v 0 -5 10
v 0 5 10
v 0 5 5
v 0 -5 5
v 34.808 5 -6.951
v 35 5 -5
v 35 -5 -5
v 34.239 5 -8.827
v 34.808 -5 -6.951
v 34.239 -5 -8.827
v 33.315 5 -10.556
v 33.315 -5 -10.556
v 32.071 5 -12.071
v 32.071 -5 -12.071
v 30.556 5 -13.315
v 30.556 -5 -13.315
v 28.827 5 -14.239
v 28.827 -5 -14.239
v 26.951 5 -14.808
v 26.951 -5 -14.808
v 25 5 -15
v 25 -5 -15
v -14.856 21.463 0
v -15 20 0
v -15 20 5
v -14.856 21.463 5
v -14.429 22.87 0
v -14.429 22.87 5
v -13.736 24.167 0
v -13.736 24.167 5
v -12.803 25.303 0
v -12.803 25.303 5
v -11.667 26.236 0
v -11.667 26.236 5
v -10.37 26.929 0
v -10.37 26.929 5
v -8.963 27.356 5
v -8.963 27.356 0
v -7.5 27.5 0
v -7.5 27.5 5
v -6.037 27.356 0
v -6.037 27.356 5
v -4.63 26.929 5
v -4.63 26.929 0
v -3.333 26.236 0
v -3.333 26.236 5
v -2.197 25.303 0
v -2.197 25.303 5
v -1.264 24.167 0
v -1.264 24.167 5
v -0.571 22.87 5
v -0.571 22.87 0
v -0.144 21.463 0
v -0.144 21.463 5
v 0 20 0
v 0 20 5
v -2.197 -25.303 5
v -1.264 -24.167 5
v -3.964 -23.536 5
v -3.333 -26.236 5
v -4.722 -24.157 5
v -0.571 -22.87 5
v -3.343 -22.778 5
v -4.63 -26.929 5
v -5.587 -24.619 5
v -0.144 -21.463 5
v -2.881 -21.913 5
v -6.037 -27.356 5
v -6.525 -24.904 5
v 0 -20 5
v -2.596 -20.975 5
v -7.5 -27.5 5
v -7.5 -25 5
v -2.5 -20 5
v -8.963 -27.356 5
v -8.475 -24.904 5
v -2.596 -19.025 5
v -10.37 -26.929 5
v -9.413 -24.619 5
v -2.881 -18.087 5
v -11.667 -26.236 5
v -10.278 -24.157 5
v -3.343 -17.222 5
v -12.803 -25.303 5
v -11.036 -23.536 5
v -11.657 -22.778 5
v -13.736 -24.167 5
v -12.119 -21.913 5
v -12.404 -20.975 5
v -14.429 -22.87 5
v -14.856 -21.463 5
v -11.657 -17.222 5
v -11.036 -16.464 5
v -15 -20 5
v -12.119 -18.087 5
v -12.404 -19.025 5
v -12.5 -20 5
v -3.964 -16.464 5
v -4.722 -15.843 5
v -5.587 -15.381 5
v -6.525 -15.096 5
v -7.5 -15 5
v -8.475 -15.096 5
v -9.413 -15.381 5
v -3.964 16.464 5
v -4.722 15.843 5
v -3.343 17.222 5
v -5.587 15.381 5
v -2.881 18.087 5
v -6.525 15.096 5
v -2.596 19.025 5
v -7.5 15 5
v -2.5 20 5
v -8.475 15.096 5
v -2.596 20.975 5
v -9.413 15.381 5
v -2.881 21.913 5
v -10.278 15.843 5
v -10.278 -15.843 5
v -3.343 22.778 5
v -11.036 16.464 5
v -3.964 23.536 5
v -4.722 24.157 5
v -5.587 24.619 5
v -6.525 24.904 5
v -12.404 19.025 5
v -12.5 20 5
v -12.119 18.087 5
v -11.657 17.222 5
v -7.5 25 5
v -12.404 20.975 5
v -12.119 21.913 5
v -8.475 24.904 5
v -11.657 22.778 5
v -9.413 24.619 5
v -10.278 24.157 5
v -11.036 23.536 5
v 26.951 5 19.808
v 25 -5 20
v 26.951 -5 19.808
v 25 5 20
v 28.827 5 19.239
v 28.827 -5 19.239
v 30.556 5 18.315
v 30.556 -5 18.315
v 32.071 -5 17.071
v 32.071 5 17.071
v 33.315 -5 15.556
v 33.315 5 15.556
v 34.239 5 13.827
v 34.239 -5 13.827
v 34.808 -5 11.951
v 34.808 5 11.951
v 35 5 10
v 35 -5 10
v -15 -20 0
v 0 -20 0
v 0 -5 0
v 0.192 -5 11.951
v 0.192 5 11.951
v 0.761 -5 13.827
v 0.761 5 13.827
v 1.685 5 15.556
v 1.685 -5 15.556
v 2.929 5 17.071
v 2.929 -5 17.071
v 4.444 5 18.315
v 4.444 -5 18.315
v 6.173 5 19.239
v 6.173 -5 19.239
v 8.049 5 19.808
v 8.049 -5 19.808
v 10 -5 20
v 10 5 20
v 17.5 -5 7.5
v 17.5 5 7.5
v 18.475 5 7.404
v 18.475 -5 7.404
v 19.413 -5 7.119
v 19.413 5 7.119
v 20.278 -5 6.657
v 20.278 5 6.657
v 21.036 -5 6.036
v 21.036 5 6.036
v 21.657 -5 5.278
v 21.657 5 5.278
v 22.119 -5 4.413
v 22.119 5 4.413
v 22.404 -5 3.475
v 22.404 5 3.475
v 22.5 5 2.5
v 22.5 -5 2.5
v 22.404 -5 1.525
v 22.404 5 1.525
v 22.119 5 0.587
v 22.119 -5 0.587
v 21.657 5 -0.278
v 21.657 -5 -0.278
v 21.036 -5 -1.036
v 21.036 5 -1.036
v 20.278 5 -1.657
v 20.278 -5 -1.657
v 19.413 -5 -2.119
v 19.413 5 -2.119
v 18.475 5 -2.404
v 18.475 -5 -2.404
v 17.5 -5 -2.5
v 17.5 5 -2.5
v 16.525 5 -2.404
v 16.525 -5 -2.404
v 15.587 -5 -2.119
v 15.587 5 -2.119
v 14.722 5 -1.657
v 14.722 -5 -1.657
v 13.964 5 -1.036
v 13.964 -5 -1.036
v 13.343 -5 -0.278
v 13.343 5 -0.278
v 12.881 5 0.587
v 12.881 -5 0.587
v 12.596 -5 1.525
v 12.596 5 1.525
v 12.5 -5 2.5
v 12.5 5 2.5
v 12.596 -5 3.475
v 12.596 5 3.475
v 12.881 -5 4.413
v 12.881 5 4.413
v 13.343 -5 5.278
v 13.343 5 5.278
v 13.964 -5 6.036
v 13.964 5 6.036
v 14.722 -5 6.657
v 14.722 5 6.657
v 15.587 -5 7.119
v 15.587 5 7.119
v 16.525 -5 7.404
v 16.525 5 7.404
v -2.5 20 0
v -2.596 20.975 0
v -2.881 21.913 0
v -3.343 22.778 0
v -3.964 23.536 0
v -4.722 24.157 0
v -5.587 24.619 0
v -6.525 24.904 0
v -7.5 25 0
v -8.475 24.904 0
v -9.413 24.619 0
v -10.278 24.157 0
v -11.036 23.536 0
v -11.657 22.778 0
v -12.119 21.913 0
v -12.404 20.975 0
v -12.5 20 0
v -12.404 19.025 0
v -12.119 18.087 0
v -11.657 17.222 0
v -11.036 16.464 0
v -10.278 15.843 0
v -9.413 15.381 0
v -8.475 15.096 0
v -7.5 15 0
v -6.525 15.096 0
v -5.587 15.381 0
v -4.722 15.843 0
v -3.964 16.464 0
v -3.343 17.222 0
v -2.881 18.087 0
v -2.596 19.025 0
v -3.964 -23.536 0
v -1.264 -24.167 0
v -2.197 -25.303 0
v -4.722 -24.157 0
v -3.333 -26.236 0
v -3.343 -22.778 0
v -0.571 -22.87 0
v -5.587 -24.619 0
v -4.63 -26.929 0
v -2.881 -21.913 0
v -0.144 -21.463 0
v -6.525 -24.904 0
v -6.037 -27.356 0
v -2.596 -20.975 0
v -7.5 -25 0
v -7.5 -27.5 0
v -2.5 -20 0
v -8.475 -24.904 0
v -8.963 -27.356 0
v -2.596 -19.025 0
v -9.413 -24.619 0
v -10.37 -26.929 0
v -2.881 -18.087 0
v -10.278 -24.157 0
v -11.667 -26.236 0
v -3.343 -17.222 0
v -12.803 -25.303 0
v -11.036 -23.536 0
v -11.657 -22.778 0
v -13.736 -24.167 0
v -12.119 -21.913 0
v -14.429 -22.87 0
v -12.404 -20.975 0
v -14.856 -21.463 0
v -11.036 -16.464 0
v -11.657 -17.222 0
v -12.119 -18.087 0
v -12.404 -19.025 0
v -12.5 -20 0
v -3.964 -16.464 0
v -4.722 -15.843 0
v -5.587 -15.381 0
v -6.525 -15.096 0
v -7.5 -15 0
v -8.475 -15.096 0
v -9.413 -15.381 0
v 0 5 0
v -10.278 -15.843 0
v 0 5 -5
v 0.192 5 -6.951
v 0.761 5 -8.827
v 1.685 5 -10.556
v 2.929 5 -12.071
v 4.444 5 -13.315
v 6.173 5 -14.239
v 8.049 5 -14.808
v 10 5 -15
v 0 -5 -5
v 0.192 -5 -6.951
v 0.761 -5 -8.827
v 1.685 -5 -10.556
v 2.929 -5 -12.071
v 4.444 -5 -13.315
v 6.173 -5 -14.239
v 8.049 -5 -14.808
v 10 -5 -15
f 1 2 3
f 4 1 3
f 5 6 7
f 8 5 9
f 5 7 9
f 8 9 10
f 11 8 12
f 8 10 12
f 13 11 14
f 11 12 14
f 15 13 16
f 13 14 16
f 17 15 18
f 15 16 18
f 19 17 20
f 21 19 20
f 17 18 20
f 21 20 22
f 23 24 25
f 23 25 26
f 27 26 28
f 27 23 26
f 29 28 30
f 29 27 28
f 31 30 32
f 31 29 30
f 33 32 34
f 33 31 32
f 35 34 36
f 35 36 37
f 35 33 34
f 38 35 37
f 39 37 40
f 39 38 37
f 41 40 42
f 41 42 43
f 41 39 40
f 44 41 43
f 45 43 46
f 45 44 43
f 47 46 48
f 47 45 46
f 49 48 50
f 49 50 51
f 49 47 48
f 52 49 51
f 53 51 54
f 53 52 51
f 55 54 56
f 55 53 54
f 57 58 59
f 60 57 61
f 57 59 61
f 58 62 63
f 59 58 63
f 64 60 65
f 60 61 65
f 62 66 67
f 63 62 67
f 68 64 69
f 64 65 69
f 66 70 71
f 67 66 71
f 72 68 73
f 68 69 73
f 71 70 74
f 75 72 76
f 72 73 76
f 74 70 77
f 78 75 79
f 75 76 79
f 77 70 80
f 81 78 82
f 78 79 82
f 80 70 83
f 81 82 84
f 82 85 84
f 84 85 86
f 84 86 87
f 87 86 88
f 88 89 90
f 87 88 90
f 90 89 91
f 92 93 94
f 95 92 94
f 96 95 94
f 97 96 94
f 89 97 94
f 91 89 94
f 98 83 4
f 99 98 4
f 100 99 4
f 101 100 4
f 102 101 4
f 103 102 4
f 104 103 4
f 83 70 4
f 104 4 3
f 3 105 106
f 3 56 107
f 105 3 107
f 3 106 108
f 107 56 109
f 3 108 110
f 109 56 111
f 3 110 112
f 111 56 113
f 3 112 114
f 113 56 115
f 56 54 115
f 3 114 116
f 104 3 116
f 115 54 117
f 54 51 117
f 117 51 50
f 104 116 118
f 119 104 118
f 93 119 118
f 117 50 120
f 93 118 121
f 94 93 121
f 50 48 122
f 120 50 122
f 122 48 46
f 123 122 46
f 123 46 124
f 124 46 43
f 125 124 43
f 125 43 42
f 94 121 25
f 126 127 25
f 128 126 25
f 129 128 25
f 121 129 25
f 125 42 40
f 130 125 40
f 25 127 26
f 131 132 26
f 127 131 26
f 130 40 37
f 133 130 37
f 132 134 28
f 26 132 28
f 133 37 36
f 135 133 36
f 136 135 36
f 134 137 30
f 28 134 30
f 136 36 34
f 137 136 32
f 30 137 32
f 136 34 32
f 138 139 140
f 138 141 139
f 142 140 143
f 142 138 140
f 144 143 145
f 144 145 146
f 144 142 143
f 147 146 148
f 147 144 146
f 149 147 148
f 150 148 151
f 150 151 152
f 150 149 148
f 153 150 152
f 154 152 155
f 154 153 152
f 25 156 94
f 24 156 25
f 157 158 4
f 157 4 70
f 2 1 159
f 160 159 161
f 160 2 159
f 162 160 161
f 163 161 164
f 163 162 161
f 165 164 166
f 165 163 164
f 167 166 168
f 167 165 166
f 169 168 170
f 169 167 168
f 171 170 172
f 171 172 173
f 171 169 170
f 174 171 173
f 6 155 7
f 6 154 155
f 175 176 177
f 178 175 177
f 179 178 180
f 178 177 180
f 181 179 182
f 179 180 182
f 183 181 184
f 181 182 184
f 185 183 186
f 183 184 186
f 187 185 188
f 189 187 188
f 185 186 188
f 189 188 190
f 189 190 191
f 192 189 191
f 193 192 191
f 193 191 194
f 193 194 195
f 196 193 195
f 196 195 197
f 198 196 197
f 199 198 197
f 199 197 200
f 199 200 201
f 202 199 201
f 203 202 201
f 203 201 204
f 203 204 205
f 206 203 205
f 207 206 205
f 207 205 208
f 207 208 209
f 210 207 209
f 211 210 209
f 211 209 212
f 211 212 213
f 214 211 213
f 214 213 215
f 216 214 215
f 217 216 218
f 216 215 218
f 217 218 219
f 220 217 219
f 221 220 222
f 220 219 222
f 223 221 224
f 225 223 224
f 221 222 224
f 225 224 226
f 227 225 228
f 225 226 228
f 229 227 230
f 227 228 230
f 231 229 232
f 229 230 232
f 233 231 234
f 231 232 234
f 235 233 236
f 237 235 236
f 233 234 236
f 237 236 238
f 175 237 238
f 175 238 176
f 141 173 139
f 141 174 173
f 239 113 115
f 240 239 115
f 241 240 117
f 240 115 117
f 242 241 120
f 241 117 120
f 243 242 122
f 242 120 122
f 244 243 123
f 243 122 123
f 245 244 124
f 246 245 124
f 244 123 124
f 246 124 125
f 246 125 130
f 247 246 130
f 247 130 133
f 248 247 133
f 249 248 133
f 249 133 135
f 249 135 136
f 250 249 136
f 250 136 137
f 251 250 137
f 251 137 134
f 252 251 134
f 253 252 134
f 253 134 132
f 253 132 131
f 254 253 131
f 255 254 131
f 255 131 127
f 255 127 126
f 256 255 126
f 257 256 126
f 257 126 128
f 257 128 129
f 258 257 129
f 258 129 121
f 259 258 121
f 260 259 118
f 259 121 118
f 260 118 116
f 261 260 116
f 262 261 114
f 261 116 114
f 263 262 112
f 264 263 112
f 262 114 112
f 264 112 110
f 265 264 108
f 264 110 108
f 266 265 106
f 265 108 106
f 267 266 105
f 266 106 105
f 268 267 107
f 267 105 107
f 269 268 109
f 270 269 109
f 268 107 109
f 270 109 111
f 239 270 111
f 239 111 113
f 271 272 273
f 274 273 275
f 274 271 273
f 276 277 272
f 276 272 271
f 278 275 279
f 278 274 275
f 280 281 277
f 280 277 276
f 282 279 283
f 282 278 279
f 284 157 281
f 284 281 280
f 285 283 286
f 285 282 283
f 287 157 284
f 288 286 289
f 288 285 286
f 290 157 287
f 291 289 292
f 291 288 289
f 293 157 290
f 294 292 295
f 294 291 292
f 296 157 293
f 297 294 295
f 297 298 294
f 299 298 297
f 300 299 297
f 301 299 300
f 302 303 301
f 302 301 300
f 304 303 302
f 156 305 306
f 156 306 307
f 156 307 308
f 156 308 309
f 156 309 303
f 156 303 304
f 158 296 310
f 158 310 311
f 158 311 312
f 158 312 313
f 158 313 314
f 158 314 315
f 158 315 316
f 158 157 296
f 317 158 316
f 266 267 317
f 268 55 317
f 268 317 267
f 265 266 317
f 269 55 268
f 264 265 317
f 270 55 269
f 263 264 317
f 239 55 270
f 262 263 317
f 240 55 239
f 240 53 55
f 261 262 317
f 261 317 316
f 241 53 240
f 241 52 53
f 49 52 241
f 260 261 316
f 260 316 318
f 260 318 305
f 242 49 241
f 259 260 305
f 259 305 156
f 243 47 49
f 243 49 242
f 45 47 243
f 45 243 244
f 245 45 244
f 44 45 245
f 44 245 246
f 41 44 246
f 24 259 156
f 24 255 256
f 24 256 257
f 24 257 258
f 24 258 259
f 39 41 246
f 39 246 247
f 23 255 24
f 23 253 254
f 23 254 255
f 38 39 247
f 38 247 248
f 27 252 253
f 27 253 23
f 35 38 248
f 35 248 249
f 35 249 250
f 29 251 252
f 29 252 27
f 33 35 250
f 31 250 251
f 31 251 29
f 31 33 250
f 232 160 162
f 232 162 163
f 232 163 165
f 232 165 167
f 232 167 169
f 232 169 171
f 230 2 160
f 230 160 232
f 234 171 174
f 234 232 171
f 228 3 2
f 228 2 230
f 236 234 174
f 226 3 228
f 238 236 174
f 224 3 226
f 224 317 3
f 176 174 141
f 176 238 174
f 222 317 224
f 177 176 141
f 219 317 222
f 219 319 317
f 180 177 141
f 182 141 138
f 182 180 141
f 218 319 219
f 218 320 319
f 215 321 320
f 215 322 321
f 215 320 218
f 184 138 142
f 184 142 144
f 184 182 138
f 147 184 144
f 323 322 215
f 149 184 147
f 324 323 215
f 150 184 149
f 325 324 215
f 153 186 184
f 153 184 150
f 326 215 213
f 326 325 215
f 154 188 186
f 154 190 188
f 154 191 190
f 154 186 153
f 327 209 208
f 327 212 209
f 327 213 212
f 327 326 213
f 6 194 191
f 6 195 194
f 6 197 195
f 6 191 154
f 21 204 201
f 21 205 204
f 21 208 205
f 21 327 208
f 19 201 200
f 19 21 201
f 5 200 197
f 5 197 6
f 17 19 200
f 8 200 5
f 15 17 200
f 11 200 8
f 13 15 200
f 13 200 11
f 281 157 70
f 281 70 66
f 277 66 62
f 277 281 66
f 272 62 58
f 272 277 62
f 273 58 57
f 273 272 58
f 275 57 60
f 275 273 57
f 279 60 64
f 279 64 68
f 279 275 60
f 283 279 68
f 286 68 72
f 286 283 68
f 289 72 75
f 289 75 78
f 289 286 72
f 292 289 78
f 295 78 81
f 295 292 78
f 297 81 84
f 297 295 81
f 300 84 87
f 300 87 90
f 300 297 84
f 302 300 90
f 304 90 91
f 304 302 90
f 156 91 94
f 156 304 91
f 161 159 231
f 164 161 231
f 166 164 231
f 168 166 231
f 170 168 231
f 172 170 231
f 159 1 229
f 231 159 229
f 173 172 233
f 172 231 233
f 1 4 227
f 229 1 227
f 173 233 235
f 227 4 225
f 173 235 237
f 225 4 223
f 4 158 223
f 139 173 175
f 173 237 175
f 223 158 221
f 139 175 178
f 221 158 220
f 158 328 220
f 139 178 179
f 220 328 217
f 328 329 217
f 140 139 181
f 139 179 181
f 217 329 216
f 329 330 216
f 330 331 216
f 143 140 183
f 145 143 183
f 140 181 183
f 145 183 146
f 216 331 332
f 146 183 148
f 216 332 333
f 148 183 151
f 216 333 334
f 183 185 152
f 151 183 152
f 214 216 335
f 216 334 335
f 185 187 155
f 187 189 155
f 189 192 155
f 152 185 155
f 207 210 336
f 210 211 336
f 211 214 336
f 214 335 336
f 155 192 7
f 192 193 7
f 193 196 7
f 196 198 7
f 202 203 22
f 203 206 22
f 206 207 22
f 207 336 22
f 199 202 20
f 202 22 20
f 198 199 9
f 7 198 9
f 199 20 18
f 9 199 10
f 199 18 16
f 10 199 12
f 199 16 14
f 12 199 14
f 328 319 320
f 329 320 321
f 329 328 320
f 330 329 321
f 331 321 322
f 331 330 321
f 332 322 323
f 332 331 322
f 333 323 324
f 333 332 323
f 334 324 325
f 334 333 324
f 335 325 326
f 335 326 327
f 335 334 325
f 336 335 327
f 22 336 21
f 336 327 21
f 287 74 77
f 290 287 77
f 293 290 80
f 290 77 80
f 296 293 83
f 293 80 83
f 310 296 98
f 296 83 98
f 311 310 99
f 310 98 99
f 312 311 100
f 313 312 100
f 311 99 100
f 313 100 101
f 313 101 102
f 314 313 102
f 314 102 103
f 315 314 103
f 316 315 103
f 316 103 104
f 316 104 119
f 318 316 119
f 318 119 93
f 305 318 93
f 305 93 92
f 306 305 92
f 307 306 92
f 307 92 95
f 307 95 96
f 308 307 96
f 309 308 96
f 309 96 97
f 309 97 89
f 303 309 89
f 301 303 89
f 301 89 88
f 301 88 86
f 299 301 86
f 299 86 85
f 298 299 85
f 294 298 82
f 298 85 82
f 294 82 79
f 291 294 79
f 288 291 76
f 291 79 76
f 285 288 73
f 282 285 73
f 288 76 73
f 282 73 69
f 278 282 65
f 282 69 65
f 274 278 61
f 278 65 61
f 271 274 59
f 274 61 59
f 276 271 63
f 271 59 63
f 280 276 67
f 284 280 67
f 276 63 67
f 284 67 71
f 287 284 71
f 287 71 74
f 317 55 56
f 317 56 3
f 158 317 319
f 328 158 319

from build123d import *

# Parameters (mm, degrees)
EXTRUDE_1_DEPTH     = 5
SKETCH_2_R          = 5
CUT_EXTRUDE_1_DEPTH = 32.721443851
SKETCH_3_W          = 35
SKETCH_3_H          = 35
EXTRUDE_2_DEPTH     = 5
FILLET_1_R          = 10
SKETCH_4_R          = 5
CUT_EXTRUDE_2_DEPTH = 52.780787943


with BuildPart() as part:
    # 草图1 → 凸台-拉伸1 (new body)
    with BuildSketch(Plane.XY):
        with BuildLine():
            Line((0, 20), (0, -20))
            ThreePointArc((0, -20), (-7.5, -27.5), (-15, -20))
            Line((-15, -20), (-15, 20))
            ThreePointArc((-15, 20), (-7.5, 27.5), (0, 20))
        make_face()
    extrude(amount=EXTRUDE_1_DEPTH)

    # 草图2 → 切除-拉伸1 (cut, through all)
    with BuildSketch(Plane.XY.offset(5)):
        with Locations((-7.5, 20)):
            Circle(SKETCH_2_R)
        with Locations((-7.5, -20)):
            Circle(SKETCH_2_R)
    extrude(amount=-CUT_EXTRUDE_1_DEPTH, mode=Mode.SUBTRACT)

    # 草图3 → 凸台-拉伸2 (add, symmetric)
    with BuildSketch(Plane(origin=(0, 0, 0), x_dir=(1, 0, 0), z_dir=(0, 1, 0))):
        with Locations((17.5, -2.5)):
            Rectangle(SKETCH_3_W, SKETCH_3_H)
    extrude(amount=EXTRUDE_2_DEPTH, both=True)

    # 圆角1
    fillet_1_edges = [part.edges().sort_by_distance(p)[0] for p in [
        (0, 0, -15),
        (0, 0, 20),
        (35, 0, 20),
        (35, 0, -15),
    ]]
    fillet(fillet_1_edges, radius=FILLET_1_R)

    # 草图4 → 切除-拉伸2 (cut, through all)
    with BuildSketch(Plane(origin=(0, 5, 0), x_dir=(1, 0, 0), z_dir=(0, 1, 0))):
        with Locations(Location((17.5, -2.5, 0), (0, 0, 270))):
            Circle(SKETCH_4_R)
    extrude(amount=-CUT_EXTRUDE_2_DEPTH, mode=Mode.SUBTRACT)


solid = part.part
